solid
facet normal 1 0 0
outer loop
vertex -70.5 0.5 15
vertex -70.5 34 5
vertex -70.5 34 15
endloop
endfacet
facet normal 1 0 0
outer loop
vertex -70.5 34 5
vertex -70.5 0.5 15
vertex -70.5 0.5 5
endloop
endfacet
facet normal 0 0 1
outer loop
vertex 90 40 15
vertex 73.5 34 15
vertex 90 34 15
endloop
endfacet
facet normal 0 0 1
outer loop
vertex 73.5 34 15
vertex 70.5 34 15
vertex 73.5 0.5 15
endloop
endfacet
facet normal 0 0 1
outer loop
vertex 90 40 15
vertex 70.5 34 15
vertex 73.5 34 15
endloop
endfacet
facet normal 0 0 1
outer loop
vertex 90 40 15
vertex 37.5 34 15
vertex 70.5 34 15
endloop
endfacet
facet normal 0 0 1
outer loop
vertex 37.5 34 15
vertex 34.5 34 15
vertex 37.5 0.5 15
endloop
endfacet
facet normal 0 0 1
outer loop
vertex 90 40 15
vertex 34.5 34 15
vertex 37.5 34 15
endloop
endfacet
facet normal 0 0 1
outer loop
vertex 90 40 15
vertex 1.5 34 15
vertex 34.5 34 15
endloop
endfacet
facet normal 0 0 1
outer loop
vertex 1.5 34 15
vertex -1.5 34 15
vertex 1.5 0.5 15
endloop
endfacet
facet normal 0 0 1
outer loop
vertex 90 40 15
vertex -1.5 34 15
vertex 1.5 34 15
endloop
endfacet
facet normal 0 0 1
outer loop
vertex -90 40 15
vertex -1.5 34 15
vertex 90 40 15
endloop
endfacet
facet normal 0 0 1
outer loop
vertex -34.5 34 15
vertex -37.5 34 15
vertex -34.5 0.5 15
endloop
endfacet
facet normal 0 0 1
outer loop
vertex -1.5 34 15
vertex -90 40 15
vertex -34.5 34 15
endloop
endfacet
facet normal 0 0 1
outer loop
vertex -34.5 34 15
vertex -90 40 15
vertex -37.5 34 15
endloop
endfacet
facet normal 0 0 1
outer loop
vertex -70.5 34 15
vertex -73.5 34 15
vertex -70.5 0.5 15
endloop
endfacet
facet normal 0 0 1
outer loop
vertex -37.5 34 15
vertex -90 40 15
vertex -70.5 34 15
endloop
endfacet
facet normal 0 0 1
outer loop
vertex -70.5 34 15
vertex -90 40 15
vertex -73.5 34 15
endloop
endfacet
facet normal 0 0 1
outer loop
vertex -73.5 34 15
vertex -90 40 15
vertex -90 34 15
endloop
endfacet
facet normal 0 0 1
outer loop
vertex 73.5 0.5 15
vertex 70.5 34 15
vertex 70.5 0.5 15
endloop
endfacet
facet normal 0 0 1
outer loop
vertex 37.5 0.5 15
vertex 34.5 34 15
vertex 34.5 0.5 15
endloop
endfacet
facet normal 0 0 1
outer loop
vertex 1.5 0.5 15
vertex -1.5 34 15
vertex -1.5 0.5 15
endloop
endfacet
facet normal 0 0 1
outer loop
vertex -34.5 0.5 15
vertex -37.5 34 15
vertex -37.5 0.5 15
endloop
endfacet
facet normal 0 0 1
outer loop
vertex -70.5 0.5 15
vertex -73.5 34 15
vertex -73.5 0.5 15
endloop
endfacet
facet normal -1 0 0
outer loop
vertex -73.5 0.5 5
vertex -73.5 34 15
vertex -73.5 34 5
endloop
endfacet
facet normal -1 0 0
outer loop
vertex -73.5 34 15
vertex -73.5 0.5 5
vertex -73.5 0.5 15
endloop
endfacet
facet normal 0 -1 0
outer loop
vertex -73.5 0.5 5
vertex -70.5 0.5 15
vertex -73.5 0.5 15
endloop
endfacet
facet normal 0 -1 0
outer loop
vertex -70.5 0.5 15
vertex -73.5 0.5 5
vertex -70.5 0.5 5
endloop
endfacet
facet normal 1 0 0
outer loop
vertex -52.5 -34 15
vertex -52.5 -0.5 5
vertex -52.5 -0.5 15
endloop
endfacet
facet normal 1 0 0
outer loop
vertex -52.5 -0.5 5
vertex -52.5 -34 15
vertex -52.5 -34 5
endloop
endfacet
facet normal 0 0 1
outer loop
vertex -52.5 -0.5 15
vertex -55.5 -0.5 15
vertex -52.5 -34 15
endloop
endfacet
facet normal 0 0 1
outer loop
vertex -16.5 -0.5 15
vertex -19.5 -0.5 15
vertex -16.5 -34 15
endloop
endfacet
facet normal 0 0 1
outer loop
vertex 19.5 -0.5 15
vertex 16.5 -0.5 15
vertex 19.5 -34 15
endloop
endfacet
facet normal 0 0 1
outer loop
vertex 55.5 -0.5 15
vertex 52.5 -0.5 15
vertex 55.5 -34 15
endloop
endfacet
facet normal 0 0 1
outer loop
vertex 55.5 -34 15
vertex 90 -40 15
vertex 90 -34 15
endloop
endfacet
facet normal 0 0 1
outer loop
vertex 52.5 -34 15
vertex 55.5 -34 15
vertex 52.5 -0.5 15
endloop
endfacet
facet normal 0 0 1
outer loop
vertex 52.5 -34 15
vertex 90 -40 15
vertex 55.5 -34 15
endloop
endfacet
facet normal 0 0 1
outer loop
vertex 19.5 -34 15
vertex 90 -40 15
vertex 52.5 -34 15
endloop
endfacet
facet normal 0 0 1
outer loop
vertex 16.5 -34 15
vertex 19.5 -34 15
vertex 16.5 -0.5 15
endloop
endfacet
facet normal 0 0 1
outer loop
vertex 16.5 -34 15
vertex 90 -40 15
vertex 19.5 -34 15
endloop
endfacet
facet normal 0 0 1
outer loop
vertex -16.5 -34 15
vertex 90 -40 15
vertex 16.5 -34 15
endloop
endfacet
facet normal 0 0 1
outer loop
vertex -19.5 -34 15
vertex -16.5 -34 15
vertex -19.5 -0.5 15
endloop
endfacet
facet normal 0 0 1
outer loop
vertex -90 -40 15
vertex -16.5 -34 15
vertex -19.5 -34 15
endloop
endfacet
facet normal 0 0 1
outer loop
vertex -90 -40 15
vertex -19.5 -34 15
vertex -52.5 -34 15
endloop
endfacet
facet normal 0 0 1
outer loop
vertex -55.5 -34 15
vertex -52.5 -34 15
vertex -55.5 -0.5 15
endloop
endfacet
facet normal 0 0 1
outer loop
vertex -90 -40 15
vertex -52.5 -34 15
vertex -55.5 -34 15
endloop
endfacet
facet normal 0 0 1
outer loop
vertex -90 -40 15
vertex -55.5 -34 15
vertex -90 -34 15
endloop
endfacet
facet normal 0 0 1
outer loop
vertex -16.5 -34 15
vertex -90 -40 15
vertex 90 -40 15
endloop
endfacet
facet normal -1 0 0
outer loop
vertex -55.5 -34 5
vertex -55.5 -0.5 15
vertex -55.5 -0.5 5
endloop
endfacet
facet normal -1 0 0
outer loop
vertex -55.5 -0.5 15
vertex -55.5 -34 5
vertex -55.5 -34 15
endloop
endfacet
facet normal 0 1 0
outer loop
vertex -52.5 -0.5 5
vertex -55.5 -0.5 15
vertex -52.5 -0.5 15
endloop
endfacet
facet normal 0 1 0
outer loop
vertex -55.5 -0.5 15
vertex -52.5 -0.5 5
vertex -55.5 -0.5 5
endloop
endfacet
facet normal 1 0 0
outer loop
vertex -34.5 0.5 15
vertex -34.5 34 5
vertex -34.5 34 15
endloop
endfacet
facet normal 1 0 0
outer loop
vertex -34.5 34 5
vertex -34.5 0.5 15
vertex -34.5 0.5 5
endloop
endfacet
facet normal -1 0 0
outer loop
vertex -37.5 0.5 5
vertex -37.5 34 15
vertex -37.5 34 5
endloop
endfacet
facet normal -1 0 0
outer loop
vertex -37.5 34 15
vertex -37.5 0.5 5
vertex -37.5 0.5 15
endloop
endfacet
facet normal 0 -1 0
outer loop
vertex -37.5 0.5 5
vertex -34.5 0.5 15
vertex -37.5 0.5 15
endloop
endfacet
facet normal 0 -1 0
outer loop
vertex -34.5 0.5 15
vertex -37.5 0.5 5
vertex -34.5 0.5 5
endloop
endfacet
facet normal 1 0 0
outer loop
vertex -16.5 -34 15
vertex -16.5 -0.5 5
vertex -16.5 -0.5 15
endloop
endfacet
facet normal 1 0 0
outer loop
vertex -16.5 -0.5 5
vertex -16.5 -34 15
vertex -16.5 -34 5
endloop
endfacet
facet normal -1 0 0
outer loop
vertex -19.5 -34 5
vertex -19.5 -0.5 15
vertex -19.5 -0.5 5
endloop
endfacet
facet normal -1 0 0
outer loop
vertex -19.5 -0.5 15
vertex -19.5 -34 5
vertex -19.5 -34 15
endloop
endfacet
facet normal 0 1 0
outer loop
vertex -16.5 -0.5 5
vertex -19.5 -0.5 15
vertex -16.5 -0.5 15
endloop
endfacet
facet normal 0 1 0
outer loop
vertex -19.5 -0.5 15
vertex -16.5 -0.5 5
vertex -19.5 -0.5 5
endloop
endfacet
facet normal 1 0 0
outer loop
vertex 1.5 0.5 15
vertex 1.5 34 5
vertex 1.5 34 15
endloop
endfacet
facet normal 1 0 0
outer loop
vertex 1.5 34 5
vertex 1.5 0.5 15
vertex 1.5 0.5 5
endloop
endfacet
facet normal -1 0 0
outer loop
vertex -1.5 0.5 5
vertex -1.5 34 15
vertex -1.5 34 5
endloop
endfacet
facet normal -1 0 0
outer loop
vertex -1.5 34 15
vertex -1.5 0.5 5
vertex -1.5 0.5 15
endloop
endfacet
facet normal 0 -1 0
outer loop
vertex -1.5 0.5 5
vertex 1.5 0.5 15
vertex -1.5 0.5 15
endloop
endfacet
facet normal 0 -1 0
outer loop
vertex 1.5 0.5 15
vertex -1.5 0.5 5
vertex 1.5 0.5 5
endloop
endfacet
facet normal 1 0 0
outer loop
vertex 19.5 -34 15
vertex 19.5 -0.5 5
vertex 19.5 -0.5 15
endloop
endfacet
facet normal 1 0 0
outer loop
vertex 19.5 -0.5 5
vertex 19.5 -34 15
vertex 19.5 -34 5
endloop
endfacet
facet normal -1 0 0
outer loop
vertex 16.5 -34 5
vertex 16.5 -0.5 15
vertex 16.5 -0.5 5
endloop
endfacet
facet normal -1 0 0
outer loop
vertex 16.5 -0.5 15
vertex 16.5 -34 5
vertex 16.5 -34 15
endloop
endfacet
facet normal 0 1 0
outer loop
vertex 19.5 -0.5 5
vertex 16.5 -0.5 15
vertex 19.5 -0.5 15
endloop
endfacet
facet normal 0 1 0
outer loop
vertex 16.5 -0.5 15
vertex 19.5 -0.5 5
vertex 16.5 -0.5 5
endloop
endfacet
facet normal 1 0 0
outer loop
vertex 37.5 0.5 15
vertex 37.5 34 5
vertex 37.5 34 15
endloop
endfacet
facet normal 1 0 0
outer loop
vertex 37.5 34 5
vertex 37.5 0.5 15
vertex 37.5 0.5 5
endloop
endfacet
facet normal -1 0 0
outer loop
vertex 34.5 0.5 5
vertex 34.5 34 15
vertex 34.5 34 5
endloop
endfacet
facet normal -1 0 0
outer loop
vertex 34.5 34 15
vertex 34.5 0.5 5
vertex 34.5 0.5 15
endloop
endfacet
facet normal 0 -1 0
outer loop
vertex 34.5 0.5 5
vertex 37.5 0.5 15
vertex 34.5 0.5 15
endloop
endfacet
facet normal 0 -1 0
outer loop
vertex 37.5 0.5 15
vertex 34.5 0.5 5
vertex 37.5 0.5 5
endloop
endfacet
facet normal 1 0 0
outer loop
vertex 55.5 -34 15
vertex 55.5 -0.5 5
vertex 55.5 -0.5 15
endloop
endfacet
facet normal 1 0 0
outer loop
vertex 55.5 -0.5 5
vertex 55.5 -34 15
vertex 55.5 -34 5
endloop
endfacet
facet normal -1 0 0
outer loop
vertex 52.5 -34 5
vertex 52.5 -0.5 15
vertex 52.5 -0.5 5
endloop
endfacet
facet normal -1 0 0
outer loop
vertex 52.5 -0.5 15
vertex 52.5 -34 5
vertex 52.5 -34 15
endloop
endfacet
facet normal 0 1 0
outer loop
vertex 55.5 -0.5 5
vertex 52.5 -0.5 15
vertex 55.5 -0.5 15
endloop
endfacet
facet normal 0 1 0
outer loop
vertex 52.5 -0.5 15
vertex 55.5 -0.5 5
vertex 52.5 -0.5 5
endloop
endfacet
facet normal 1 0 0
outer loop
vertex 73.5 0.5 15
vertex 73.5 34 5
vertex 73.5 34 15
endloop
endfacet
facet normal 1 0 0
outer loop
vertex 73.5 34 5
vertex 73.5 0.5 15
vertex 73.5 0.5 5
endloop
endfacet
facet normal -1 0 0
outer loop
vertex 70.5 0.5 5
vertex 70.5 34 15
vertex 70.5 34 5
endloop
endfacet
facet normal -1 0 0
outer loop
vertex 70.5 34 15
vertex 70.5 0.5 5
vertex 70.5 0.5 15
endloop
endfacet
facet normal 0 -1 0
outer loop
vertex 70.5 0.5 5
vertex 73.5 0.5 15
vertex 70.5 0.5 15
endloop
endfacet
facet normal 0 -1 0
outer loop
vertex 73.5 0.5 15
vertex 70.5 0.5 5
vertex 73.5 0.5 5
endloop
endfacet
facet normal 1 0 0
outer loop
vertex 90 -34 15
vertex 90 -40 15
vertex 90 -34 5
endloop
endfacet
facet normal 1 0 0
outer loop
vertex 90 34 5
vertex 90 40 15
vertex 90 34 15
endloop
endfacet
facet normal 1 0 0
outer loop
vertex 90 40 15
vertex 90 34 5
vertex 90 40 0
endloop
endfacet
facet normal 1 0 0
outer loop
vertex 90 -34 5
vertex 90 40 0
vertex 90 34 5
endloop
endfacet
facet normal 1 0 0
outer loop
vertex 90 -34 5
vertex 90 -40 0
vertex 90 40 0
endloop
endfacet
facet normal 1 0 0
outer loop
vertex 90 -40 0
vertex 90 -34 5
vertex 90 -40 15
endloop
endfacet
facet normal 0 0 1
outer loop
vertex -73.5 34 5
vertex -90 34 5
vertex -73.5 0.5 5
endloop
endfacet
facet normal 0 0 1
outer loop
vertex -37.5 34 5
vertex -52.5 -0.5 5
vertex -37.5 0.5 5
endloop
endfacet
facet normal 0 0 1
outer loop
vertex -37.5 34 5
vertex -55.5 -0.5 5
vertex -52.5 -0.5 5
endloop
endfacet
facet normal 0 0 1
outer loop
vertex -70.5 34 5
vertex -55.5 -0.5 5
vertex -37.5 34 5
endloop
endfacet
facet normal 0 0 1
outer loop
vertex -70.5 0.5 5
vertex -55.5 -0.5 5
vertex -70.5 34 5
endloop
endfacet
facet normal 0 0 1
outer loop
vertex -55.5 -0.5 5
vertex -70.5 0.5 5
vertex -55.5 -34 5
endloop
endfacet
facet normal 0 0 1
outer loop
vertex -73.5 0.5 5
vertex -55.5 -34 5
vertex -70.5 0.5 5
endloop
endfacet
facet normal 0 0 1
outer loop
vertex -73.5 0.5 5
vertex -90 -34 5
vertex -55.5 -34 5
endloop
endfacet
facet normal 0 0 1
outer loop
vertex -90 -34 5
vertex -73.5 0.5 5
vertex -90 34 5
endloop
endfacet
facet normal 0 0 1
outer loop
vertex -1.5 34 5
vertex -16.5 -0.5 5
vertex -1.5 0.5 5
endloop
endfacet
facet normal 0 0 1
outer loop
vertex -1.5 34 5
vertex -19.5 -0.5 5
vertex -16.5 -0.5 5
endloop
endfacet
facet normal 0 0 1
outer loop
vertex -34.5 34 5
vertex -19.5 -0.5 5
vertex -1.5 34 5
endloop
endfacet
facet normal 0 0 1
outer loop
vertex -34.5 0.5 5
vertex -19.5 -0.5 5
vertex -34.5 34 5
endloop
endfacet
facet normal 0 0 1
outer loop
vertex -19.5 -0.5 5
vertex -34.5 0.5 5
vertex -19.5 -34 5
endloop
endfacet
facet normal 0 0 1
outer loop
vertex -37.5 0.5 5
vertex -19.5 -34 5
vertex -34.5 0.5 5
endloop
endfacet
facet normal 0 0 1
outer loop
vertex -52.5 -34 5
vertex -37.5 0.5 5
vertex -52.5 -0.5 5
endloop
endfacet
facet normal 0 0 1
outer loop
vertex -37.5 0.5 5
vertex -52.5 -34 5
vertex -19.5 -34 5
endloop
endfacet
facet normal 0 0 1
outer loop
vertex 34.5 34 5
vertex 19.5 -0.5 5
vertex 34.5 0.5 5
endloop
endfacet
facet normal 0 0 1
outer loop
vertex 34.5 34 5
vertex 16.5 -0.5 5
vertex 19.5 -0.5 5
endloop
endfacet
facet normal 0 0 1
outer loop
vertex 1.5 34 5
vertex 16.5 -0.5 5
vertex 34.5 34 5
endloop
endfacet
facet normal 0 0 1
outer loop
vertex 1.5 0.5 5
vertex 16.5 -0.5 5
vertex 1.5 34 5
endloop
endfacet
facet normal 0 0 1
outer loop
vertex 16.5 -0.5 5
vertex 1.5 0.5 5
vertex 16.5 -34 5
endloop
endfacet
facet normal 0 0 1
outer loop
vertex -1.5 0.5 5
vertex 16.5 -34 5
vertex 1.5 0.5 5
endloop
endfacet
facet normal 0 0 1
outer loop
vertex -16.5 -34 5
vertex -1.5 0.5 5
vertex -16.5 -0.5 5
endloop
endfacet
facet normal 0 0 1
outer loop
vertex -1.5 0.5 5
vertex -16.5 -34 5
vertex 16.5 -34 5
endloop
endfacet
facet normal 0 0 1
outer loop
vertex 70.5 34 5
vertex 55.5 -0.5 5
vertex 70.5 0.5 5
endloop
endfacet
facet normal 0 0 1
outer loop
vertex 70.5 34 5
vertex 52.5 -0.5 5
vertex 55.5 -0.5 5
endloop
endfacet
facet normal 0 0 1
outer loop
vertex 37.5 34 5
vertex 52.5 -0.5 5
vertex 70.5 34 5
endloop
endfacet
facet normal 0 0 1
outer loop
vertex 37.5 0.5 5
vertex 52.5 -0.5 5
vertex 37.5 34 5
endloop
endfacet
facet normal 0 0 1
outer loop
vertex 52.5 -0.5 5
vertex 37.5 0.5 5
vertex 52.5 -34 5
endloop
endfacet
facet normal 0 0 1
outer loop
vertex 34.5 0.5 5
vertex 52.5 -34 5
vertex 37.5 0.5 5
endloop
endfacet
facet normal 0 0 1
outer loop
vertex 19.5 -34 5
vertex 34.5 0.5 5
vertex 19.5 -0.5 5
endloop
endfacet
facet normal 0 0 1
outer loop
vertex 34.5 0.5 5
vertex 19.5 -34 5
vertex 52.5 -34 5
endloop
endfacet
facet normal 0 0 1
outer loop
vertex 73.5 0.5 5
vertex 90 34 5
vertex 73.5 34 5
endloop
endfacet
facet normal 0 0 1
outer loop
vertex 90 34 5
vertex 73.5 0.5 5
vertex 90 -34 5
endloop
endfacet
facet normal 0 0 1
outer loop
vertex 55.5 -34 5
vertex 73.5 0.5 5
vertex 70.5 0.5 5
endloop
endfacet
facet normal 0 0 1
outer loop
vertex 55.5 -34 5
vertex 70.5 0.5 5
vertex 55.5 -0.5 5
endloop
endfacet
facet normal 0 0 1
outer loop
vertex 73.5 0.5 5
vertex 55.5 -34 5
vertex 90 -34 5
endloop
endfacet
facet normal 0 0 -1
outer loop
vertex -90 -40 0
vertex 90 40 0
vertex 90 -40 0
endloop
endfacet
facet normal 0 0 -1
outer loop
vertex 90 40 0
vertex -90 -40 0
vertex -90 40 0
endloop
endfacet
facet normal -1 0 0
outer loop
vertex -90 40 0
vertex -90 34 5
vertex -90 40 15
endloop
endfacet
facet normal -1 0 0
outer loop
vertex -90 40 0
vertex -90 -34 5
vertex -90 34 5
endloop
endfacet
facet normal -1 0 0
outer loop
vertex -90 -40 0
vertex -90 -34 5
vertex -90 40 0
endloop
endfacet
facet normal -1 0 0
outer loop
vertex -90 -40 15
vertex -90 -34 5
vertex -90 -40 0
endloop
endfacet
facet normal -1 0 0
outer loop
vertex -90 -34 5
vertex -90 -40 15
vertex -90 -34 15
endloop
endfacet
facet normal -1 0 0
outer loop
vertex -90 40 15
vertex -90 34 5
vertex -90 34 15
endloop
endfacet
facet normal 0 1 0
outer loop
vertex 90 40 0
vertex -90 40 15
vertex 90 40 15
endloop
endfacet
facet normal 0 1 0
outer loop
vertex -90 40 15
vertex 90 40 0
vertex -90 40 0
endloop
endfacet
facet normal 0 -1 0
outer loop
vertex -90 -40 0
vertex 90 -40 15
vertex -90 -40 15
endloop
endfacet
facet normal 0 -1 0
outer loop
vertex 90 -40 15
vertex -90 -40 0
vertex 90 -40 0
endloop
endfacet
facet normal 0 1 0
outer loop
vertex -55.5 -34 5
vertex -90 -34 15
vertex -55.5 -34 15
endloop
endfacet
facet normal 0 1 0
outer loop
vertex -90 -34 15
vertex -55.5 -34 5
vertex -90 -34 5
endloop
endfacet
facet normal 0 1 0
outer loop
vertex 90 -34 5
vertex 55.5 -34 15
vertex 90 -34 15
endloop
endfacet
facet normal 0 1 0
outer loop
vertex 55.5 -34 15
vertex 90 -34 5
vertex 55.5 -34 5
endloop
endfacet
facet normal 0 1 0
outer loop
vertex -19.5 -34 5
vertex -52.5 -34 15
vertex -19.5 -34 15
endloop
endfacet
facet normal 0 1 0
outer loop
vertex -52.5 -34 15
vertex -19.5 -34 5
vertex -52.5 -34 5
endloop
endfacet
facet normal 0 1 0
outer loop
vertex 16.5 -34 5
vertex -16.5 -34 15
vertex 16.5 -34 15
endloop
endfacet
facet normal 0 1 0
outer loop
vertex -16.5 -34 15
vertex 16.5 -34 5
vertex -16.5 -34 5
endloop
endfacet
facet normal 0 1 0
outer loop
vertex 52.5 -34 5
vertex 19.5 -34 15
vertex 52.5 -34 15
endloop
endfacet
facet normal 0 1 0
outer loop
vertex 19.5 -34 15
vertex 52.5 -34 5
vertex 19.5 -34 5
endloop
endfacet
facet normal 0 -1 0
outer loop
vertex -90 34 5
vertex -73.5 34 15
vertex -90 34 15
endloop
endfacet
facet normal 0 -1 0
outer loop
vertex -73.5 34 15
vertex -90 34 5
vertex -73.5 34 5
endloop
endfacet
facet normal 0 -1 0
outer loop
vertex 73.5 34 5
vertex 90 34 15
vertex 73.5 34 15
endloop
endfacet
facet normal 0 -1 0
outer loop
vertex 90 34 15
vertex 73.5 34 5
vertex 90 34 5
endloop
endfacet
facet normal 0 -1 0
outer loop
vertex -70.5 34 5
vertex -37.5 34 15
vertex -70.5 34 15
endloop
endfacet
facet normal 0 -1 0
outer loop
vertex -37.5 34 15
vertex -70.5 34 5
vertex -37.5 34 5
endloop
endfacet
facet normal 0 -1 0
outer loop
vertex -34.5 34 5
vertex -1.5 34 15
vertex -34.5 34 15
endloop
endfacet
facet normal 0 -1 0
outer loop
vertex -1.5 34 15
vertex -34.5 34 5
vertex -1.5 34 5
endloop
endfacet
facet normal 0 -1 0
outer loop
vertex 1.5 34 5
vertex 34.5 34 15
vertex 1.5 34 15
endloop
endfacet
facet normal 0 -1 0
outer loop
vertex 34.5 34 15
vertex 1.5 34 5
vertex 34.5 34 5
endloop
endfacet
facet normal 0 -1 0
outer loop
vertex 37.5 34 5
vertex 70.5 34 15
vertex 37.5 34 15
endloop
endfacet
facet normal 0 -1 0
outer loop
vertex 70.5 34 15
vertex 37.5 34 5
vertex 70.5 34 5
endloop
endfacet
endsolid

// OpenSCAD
$fn = 32;

// ----------------------------------------------------------------------
// Rib frame 180 x 80 x 15
// 9 ribs at 18 mm pitch, staggered
// ----------------------------------------------------------------------

// --- parameters (mm) ---
frame = [180, 80, 5];  // base plate size (x, y, z)
rail_w = 6;            // side rail width
ribs = 9;              // number of ribs
rib_t = 3;             // rib thickness
rib_h = 10;            // rib height above the base plate
pitch = 18;            // pitch between rib centres

// --- derived feature positions (mm) ---
span = (ribs - 1) * pitch;          // = 144   distance between the outer ribs
origin_x = -span / 2;               // = -72   X of the first rib
rib_len = frame[1] / 2 - rail_w + 0.5;  // = 34.5   length of a staggered rib
rib_y = 0.5 + rib_len / 2;          // = 17.75   Y of a staggered rib centre
row_offset = 2 * rib_y;             // = 35.5   distance between the two rows
feature_centers = [
  [origin_x + 0 * pitch, rib_y],
  [origin_x + 1 * pitch, -rib_y],
  [origin_x + 2 * pitch, rib_y],
  [origin_x + 3 * pitch, -rib_y],
  [origin_x + 4 * pitch, rib_y],
  [origin_x + 5 * pitch, -rib_y],
  [origin_x + 6 * pitch, rib_y],
  [origin_x + 7 * pitch, -rib_y],
  [origin_x + 8 * pitch, rib_y]
];   // rib centre line, drives the rib loop

// base plate, two side rails, then the ribs read straight off feature_centers
union() {
  translate([-frame[0] / 2, -frame[1] / 2, 0]) cube(frame);
  translate([-frame[0] / 2, -frame[1] / 2, 0]) cube([frame[0], rail_w, frame[2] + rib_h]);
  translate([-frame[0] / 2, frame[1] / 2 - rail_w, 0]) cube([frame[0], rail_w, frame[2] + rib_h]);
  for (centre = feature_centers)
    translate([centre[0] - rib_t / 2, centre[1] - rib_len / 2, frame[2] - 1])
      cube([rib_t, rib_len, rib_h + 1]);
}
